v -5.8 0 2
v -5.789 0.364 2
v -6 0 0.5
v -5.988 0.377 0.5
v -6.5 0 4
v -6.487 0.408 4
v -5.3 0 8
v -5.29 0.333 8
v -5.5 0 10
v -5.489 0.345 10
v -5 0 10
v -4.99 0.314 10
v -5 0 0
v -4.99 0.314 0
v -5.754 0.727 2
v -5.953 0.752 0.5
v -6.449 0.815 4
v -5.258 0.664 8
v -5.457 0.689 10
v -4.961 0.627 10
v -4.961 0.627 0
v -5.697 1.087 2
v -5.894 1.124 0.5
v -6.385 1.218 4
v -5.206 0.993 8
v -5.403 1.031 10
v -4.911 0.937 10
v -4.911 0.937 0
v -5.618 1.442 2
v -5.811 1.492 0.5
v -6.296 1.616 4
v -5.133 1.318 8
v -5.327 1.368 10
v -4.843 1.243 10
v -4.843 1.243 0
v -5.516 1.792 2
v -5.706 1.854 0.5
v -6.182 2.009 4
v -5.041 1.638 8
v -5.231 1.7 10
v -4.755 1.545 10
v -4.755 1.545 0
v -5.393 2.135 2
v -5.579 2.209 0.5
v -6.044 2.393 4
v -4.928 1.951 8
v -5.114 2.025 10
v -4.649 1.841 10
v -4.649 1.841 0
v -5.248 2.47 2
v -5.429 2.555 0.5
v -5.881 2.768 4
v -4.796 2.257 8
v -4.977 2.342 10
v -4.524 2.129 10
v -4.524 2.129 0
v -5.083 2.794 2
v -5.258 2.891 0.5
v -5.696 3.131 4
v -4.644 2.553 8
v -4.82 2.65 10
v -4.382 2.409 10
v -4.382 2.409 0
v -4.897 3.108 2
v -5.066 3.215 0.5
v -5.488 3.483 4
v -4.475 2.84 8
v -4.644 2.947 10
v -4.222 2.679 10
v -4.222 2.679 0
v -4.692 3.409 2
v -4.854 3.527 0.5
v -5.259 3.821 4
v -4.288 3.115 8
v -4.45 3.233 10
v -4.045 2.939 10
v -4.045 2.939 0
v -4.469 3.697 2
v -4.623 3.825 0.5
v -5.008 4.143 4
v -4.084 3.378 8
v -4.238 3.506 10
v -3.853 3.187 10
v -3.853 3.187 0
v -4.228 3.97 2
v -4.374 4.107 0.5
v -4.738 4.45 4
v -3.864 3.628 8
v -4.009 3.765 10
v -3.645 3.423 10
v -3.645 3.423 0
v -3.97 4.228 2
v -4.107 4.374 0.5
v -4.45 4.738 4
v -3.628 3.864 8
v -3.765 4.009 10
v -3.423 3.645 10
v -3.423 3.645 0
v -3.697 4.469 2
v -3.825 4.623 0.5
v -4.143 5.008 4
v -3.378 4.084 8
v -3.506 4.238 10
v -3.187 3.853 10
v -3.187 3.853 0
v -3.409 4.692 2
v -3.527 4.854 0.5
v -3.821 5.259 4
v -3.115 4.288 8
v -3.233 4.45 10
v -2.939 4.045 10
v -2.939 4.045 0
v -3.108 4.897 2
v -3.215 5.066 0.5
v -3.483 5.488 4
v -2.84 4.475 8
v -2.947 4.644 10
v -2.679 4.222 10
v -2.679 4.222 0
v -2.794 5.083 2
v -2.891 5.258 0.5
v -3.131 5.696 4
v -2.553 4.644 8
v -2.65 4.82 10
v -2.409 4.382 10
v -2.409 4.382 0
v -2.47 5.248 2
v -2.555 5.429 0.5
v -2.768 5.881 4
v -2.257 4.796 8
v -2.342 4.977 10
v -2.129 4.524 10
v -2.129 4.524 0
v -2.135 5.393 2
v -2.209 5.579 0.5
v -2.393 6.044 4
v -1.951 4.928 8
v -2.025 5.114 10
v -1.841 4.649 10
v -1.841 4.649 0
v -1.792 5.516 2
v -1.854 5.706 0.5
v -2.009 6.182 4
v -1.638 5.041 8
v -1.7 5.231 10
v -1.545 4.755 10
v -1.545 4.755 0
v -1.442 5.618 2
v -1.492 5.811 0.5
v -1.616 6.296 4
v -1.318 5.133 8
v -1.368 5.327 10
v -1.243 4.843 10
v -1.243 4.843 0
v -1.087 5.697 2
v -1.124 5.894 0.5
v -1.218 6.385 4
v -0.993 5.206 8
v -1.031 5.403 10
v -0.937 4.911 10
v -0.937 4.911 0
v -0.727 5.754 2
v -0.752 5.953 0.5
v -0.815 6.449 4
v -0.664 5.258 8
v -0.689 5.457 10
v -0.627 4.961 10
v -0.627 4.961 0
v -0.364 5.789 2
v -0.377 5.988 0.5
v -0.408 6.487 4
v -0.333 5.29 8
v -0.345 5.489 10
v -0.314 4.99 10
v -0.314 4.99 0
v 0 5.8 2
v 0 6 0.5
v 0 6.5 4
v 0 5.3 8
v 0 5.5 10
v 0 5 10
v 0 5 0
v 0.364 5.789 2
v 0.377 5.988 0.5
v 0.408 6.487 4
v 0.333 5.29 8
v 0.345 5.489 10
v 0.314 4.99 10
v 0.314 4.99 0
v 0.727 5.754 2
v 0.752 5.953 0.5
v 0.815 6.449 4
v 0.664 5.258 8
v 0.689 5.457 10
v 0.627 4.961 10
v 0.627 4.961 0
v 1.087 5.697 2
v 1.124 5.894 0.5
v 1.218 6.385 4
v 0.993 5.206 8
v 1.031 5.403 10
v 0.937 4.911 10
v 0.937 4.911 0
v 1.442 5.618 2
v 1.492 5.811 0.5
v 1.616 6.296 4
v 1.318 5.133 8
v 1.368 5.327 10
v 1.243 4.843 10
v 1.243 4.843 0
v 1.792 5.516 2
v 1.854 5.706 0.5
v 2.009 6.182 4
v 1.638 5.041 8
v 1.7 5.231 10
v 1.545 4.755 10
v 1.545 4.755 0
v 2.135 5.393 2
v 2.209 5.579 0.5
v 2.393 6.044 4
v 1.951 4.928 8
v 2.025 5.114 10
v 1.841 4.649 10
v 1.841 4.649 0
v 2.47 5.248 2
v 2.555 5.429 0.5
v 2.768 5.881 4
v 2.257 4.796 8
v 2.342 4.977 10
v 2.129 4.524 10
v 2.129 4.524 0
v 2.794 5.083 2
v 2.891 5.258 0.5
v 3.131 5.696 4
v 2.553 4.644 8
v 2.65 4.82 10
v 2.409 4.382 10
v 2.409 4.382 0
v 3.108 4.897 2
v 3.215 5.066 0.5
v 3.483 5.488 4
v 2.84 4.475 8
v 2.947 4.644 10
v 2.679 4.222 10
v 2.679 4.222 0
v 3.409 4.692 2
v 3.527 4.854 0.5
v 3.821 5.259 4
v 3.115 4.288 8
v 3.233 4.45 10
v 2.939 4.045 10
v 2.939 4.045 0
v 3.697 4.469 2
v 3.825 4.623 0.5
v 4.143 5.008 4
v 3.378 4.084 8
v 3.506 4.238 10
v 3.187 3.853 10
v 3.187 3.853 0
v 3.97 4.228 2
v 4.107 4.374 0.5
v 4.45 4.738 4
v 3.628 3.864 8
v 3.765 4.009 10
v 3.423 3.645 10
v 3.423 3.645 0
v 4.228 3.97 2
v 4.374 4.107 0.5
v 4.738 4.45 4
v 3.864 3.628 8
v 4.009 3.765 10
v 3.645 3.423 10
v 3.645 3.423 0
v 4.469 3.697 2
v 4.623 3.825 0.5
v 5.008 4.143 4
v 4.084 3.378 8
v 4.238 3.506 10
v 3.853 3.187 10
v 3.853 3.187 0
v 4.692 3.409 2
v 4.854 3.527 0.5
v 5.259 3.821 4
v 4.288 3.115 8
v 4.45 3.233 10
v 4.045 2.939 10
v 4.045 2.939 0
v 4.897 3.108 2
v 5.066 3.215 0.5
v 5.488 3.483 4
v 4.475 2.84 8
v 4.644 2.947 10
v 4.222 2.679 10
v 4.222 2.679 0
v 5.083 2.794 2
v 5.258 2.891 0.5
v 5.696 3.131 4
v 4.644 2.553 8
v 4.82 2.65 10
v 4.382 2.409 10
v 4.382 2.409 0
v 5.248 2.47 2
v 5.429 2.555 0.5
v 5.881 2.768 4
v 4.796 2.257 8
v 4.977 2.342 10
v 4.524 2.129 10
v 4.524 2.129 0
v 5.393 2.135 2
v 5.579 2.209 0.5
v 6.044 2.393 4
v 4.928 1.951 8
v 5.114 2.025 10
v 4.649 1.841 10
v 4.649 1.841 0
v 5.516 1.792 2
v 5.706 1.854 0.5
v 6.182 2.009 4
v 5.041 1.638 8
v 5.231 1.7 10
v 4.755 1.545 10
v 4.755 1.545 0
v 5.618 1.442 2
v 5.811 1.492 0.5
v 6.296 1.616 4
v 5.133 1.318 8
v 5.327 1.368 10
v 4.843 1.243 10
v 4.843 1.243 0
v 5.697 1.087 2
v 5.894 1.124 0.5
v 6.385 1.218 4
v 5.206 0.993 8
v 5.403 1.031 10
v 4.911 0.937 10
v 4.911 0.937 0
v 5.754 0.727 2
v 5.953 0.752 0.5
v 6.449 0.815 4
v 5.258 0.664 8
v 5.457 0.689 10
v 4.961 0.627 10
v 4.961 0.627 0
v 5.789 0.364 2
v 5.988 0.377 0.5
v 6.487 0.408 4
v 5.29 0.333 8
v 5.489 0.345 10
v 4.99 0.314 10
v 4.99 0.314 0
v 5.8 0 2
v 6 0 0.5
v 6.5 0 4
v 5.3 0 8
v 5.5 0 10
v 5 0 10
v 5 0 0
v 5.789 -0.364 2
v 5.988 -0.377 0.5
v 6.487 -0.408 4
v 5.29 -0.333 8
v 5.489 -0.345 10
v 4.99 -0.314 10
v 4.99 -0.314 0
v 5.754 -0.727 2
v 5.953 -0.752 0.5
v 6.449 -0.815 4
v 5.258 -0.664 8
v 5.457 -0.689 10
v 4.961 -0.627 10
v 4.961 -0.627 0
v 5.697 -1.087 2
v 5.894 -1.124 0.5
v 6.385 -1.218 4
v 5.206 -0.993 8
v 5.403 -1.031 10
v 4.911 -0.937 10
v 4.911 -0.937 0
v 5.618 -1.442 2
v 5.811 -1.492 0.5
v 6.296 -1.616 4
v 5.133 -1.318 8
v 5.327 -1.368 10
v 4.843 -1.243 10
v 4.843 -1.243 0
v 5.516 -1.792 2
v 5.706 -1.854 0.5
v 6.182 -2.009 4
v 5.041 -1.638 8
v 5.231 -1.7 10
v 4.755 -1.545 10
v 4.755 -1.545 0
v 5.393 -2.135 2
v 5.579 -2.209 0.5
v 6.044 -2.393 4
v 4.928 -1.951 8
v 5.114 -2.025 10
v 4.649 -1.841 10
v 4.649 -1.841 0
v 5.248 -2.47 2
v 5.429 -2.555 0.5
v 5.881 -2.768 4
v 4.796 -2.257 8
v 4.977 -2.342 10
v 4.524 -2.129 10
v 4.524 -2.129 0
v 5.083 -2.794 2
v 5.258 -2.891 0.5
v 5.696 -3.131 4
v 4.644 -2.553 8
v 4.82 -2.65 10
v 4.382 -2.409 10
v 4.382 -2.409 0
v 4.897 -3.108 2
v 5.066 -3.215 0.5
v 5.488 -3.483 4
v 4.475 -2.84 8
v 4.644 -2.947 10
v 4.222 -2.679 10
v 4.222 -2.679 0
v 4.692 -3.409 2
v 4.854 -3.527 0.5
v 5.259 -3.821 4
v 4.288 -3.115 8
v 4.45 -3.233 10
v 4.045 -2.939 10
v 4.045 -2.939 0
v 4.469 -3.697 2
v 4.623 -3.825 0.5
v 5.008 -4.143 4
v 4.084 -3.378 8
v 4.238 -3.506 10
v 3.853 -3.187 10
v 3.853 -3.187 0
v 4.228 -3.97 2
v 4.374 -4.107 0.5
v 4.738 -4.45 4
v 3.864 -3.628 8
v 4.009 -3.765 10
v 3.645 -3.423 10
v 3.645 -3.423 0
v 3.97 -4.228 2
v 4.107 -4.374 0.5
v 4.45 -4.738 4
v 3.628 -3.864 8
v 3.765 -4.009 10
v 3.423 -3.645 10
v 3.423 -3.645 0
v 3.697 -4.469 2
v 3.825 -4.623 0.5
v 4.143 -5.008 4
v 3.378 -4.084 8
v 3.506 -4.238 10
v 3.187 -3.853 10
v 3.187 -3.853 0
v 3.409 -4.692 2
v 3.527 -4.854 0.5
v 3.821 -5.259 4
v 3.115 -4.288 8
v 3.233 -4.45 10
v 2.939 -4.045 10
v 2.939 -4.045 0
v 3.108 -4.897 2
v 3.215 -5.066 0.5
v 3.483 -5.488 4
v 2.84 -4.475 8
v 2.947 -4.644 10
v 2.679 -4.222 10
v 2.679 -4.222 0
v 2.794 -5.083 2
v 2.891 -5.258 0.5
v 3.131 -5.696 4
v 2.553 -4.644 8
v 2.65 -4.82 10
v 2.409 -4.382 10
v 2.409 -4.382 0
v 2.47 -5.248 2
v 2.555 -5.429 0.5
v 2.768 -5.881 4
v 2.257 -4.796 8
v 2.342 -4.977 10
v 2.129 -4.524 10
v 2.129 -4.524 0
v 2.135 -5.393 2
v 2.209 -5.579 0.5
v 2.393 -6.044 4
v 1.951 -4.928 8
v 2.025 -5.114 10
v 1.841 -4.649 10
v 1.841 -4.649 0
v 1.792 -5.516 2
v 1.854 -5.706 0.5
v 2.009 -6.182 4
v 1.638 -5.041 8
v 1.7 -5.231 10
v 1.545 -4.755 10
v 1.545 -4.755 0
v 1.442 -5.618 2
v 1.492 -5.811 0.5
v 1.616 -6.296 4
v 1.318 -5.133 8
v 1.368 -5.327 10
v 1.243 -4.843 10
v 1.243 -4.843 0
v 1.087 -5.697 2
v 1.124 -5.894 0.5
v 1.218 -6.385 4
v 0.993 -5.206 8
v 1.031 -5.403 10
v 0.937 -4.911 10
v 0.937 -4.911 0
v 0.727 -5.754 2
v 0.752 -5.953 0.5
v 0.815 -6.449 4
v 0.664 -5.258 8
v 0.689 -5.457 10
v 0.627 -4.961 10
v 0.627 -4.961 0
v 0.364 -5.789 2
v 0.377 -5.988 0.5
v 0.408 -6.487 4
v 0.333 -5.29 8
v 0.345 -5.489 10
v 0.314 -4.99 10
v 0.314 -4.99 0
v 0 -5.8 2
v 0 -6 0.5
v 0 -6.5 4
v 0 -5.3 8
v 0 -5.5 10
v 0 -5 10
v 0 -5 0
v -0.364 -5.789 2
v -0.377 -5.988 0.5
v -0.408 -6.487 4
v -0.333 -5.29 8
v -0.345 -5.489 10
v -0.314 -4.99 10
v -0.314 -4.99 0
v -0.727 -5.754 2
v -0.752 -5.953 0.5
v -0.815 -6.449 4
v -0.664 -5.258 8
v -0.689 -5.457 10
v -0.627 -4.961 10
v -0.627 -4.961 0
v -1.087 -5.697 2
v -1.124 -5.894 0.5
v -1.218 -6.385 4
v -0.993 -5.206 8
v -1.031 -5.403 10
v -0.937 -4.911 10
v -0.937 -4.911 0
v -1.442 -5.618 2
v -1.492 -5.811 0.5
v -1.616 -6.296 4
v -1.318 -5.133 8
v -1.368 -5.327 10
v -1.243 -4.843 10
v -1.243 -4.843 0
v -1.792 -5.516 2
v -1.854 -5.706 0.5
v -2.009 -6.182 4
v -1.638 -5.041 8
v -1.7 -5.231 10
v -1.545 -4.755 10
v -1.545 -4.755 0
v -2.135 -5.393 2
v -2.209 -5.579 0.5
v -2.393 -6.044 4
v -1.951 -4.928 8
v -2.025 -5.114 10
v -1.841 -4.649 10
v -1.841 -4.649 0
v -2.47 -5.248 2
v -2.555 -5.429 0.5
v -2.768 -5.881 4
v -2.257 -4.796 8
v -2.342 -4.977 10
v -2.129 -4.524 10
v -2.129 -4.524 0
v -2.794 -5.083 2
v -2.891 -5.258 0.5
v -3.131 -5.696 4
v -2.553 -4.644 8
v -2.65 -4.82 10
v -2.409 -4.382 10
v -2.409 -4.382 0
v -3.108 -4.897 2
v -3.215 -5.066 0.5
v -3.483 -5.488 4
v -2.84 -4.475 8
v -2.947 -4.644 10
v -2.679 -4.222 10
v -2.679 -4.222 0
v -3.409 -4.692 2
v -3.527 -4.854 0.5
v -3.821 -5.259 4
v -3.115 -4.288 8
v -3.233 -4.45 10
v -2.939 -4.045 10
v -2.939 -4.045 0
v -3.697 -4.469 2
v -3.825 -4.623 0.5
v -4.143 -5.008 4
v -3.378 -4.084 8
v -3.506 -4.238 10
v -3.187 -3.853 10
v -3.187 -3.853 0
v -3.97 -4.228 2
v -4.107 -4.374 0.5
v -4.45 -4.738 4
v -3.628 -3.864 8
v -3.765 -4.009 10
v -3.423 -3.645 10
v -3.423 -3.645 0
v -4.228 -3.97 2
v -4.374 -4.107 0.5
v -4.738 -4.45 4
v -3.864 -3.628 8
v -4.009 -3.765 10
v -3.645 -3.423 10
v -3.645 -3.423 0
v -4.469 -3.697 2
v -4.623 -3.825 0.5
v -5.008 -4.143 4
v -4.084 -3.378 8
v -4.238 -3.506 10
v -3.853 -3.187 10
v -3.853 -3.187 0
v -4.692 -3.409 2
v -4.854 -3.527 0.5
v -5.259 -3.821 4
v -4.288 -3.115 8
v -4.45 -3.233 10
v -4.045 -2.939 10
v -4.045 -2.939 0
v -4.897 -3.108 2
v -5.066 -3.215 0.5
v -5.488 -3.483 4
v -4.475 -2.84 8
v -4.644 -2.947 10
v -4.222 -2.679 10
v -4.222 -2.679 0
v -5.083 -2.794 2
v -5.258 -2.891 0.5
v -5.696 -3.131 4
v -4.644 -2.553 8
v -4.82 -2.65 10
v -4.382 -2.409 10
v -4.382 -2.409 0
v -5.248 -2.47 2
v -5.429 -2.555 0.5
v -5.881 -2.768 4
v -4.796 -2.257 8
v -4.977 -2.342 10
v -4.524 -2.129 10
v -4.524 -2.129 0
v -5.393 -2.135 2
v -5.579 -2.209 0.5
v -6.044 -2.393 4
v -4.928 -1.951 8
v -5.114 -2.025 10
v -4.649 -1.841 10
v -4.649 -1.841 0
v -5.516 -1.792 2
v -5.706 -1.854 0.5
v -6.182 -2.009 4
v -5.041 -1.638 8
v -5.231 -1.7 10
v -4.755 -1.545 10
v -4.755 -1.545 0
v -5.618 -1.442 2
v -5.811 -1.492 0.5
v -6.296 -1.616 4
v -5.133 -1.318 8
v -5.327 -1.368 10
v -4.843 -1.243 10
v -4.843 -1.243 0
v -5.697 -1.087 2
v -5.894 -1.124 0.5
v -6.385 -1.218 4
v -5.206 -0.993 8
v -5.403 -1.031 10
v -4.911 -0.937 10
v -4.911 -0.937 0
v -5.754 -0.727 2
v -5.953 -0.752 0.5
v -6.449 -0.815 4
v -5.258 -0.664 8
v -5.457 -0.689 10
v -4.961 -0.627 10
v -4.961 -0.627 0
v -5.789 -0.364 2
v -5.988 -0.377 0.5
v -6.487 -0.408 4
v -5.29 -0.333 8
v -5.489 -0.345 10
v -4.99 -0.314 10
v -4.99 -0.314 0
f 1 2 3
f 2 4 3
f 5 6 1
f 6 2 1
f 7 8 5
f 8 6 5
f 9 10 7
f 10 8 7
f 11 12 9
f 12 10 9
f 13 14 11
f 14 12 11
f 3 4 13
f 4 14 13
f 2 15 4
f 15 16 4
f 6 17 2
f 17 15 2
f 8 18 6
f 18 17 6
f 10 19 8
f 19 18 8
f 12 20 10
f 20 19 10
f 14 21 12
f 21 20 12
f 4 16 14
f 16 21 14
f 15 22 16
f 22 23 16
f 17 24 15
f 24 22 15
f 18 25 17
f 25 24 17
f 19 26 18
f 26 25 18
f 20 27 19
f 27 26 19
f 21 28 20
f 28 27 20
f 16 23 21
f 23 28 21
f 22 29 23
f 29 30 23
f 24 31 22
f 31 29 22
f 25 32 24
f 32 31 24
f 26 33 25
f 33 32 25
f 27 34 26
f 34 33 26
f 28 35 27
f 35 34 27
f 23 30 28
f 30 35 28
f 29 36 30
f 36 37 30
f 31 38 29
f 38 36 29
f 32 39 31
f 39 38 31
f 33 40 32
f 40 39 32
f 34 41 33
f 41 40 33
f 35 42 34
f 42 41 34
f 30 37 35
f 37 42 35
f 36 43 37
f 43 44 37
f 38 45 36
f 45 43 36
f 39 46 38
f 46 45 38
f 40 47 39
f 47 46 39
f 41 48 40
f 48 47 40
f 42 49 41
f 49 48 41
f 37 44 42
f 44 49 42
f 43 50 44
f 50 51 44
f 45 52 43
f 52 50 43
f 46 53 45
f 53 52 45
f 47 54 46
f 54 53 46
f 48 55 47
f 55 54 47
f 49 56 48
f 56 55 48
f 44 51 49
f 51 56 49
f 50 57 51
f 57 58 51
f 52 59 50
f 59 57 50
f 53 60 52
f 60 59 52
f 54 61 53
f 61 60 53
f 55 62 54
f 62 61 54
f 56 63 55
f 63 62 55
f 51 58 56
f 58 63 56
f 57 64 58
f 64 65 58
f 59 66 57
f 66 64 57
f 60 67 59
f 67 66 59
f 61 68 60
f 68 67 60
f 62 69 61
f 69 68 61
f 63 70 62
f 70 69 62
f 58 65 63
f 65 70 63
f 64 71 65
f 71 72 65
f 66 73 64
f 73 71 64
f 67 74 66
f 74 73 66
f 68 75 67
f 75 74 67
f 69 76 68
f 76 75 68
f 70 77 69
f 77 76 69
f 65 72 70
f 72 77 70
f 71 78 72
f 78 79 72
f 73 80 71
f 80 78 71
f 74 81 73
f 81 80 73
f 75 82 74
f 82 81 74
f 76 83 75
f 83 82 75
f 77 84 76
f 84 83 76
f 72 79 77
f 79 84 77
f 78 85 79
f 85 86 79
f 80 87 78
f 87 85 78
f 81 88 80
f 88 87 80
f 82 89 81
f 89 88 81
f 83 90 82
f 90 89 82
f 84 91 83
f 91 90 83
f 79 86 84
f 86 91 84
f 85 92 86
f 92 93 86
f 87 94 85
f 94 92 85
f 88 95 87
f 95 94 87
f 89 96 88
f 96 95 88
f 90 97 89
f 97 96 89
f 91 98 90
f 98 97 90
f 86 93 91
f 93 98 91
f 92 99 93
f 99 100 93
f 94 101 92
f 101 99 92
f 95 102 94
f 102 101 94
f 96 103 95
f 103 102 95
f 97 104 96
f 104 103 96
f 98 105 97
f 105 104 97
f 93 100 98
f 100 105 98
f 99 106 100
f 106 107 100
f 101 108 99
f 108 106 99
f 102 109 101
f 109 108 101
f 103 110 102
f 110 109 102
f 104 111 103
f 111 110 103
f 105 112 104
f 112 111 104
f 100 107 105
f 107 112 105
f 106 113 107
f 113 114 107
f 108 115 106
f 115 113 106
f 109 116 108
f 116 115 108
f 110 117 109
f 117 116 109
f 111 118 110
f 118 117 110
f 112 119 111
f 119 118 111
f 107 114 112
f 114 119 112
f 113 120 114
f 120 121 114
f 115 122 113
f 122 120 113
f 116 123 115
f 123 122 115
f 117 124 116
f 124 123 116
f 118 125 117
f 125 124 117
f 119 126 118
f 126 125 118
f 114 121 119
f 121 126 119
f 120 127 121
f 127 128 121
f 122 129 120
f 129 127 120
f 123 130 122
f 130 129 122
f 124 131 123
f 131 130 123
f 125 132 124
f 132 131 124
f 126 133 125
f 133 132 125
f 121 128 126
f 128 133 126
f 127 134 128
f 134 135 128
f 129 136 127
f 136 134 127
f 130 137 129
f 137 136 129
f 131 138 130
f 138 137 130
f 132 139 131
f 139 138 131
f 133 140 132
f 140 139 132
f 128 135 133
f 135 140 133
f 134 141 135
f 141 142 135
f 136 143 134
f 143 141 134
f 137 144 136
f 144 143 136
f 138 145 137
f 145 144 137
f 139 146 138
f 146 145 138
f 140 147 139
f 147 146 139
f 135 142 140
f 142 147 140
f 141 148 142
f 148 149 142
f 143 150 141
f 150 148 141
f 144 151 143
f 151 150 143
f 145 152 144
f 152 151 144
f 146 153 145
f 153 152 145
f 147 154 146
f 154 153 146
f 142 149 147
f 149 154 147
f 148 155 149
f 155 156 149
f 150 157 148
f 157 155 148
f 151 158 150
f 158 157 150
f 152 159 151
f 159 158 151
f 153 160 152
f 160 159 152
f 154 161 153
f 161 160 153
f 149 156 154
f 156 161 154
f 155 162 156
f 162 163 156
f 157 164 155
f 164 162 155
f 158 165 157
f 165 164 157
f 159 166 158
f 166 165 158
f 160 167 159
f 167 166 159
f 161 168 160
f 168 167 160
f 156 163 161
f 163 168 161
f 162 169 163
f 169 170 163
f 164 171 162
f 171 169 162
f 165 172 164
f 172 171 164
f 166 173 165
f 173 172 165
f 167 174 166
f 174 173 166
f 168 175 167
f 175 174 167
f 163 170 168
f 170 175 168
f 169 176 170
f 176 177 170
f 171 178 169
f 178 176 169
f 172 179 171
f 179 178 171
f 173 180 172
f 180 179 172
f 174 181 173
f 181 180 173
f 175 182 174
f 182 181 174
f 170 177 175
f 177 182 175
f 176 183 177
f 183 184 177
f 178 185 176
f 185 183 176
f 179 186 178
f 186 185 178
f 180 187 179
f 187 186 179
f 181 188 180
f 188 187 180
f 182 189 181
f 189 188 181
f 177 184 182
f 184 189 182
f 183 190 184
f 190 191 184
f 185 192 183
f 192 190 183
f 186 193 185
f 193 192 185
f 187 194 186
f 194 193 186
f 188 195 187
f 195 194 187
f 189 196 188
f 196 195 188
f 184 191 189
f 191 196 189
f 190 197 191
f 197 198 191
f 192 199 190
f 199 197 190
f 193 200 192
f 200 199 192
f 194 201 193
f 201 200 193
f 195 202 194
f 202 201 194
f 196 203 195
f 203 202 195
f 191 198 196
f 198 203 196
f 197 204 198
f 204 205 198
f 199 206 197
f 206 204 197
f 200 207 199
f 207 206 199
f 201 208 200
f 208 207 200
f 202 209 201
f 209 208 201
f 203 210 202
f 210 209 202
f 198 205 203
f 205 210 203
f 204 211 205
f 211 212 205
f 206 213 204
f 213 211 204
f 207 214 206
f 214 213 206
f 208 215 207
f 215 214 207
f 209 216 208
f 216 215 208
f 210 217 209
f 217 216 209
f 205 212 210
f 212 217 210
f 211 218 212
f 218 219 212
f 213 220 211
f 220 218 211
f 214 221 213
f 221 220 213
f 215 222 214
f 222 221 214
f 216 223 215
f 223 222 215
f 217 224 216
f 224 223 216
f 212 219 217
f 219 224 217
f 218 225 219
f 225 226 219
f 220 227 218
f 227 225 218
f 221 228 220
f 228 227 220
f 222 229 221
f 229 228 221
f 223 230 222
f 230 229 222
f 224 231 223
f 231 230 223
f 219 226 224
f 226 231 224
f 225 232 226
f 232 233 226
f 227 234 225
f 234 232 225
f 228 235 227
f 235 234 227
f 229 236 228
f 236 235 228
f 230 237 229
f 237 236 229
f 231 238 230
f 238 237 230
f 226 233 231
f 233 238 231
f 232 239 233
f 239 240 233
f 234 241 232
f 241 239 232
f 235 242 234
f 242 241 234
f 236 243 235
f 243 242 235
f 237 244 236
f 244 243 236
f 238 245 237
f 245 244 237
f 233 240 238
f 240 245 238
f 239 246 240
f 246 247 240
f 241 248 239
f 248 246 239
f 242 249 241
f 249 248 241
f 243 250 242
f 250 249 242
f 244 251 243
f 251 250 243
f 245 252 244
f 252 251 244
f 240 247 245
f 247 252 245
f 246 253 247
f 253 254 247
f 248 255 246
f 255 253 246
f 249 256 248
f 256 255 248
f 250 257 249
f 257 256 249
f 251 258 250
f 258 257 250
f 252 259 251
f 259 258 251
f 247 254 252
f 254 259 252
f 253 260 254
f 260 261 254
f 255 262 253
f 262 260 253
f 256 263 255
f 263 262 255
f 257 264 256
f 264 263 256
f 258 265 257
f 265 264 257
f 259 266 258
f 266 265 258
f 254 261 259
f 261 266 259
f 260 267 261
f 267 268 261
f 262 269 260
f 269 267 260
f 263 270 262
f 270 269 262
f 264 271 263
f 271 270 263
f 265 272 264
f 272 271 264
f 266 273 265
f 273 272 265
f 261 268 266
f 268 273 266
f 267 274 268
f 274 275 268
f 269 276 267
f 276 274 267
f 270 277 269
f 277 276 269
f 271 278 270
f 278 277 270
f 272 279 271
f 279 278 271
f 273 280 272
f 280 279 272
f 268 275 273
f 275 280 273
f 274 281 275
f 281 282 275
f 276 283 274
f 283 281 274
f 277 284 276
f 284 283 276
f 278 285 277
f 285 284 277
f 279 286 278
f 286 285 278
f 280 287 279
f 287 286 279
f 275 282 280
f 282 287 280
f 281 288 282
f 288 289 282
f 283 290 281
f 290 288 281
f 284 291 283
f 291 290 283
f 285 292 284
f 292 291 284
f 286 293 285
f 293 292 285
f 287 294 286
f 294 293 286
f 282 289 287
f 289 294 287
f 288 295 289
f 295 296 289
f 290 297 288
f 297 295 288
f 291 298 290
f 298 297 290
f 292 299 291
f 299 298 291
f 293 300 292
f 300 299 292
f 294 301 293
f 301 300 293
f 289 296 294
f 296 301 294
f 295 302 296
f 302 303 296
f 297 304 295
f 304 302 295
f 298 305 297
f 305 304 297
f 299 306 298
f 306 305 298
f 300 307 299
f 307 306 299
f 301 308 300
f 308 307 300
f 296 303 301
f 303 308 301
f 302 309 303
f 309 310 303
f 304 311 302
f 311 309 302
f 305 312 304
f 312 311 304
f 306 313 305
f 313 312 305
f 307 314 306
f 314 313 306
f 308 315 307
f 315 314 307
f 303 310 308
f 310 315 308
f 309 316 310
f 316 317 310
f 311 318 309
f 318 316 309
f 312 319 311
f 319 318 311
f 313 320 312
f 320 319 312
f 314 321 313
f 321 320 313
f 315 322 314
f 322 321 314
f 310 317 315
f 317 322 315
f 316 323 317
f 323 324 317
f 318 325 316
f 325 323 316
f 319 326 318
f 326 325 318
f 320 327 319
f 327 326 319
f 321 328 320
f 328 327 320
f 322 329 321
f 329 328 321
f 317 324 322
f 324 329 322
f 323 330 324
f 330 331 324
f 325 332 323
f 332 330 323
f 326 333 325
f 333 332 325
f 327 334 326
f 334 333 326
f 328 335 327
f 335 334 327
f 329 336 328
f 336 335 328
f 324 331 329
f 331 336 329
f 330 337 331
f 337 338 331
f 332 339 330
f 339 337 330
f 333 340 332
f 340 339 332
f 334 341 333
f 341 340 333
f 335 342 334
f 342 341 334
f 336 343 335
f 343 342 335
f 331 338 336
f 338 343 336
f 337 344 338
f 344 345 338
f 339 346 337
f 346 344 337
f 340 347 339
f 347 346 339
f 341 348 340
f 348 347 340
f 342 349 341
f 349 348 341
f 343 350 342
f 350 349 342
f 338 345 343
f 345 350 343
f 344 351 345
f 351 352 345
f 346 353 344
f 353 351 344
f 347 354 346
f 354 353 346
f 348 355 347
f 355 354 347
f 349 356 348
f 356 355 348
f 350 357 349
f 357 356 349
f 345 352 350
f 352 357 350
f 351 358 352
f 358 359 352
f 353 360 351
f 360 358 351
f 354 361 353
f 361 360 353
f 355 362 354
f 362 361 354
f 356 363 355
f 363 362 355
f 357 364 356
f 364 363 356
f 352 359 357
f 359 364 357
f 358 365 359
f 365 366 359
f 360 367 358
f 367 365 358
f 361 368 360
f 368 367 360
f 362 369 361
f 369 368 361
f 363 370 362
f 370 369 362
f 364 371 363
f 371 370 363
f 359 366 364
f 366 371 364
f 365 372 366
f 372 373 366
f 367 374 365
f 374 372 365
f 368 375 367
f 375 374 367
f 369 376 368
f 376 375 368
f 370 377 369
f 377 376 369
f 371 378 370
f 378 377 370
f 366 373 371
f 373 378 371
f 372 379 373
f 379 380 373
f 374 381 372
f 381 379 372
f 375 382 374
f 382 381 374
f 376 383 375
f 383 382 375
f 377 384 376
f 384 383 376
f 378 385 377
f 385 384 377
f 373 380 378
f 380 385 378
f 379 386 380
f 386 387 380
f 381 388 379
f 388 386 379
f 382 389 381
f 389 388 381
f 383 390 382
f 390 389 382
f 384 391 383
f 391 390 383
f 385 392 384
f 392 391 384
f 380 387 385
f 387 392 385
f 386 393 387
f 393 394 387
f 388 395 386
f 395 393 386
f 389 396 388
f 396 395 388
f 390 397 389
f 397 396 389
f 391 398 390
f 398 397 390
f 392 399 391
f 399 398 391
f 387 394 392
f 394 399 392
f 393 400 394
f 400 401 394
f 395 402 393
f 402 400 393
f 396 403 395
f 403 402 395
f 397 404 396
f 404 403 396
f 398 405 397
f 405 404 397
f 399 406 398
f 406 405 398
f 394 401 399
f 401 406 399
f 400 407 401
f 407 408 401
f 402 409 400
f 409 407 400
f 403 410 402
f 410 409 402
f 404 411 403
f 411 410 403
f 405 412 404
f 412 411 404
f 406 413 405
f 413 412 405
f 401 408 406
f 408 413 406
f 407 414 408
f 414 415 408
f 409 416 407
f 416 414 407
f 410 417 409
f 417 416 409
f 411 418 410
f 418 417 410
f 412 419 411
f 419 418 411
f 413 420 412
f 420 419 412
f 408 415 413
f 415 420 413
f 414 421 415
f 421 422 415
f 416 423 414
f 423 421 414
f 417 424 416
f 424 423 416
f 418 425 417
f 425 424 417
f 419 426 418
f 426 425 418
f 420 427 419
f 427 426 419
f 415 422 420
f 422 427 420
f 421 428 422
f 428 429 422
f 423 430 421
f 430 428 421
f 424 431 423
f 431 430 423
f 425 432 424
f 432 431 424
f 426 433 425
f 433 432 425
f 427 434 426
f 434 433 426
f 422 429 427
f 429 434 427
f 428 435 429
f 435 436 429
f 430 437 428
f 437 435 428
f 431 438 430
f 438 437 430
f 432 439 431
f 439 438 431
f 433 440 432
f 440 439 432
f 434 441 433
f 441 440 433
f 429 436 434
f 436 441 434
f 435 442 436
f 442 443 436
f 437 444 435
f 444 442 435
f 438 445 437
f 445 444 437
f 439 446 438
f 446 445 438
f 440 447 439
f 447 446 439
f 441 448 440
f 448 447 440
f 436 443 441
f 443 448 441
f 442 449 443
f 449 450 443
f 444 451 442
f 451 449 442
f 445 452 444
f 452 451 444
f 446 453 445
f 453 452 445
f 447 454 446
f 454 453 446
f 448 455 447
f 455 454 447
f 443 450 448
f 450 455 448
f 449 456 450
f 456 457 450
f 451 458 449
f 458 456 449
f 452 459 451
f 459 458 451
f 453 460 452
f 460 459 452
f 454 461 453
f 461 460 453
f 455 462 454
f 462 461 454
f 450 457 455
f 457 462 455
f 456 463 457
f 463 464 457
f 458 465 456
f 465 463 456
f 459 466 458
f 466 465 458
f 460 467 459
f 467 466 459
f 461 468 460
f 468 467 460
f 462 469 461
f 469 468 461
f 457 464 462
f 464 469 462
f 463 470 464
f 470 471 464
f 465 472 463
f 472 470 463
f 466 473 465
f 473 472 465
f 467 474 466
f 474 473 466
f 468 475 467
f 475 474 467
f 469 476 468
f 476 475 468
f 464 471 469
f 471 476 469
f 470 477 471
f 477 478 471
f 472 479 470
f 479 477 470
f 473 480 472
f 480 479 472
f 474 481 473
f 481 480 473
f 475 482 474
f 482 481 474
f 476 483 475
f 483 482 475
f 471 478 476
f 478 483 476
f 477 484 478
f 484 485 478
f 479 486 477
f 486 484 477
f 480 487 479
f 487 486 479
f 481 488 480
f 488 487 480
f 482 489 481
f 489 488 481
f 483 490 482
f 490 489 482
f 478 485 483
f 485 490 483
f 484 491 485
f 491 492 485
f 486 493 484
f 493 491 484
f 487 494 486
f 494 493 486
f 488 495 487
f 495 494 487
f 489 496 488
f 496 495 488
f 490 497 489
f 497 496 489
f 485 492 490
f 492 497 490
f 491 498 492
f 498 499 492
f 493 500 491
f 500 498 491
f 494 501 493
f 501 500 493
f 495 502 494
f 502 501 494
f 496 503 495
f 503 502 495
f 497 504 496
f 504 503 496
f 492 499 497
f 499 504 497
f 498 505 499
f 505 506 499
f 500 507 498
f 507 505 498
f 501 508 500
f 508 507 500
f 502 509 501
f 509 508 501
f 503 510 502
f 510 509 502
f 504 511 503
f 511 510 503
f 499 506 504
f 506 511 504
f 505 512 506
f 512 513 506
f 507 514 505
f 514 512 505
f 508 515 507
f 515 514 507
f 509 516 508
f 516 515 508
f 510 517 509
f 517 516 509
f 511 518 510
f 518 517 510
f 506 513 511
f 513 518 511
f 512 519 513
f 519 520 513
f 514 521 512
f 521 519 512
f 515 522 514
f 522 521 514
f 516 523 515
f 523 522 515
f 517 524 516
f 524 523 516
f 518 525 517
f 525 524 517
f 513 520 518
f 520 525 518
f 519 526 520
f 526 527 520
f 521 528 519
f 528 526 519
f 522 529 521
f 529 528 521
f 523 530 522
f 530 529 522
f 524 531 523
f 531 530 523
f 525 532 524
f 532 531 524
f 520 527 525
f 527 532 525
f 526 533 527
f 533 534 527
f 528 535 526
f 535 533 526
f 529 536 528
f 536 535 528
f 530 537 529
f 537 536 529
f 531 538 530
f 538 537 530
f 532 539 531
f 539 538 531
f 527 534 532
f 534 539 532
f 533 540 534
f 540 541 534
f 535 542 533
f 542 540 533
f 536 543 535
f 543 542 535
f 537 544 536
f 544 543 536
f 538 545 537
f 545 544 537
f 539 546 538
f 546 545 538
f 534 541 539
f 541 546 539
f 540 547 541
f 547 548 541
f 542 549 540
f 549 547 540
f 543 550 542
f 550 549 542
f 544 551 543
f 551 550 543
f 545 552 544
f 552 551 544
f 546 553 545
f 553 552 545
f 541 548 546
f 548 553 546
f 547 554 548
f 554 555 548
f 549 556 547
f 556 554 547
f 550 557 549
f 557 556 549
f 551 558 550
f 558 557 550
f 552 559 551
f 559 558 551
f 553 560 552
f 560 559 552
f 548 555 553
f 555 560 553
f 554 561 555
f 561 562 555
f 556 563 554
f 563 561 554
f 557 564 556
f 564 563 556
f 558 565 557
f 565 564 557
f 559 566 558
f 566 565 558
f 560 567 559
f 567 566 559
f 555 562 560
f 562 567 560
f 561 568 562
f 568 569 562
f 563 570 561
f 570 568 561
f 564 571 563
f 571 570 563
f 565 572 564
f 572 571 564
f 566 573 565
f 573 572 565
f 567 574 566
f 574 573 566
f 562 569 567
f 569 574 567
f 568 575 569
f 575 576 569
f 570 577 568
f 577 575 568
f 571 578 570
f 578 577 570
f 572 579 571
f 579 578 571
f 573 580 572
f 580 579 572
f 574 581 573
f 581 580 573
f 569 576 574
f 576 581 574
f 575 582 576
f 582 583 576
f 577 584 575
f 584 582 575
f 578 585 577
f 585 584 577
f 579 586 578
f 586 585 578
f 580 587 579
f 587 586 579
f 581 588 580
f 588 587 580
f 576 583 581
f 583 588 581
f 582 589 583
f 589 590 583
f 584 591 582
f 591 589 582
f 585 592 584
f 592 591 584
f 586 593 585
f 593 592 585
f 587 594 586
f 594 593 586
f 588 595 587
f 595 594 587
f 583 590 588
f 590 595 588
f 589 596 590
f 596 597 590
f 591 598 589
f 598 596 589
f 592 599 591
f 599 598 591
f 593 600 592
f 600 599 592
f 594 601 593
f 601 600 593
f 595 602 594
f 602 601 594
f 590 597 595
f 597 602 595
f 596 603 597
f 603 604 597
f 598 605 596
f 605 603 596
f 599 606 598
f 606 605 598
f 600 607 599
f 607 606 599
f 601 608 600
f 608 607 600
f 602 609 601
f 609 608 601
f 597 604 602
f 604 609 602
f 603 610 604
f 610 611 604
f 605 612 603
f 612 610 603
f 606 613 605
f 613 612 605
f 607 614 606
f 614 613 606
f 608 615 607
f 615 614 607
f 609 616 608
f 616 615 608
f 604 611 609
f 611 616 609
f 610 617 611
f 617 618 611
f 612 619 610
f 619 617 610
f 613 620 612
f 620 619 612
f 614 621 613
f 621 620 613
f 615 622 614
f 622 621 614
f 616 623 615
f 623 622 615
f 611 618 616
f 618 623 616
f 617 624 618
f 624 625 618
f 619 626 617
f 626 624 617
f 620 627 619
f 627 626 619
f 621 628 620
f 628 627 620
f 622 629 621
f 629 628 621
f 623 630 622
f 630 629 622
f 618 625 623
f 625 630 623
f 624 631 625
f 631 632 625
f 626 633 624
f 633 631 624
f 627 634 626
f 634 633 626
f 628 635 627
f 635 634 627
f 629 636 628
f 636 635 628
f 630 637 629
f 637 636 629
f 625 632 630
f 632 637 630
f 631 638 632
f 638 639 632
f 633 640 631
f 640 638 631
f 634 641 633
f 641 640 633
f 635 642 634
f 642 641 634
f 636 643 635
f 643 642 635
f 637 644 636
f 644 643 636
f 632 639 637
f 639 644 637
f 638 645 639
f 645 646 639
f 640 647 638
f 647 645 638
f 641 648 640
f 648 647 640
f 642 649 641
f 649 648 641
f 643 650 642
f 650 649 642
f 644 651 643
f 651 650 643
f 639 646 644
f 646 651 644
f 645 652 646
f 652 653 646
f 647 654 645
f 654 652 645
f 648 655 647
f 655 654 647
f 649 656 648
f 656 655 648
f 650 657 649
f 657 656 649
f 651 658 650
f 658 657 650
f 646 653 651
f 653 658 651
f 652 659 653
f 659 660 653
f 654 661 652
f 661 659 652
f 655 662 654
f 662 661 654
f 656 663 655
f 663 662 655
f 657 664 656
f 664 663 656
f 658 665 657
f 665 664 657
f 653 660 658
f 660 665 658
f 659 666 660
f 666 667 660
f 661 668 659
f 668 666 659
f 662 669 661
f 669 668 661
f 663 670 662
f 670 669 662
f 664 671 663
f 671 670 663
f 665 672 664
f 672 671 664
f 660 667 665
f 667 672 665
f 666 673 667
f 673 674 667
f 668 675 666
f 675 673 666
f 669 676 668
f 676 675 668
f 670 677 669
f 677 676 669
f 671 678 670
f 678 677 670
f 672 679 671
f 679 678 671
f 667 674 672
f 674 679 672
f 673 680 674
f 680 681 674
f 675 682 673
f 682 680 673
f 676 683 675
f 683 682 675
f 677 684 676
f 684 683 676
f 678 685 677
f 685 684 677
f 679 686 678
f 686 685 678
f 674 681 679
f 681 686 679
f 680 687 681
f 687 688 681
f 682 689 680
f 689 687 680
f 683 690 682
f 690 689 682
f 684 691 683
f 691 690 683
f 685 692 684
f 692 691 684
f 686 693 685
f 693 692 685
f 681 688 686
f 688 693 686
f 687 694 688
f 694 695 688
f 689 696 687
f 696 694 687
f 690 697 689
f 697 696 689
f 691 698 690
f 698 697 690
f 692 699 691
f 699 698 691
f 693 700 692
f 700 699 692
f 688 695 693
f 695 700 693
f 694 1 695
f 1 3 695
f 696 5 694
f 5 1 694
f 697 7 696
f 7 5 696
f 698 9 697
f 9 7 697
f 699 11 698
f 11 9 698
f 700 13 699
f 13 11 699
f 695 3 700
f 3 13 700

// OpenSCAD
$fn = 100;

module vase() {
    rotate_extrude(angle = 360) {
        translate([5, 0, 0]) {
            scale([1, 1]) {
                polygon(points = [
                    [0, 0],
                    [1, 0.5],
                    [0.8, 2],
                    [1.5, 4],
                    [0.3, 8],
                    [0.5, 10],
                    [0, 10]
                ]);
            }
        }
    }
}

vase();
